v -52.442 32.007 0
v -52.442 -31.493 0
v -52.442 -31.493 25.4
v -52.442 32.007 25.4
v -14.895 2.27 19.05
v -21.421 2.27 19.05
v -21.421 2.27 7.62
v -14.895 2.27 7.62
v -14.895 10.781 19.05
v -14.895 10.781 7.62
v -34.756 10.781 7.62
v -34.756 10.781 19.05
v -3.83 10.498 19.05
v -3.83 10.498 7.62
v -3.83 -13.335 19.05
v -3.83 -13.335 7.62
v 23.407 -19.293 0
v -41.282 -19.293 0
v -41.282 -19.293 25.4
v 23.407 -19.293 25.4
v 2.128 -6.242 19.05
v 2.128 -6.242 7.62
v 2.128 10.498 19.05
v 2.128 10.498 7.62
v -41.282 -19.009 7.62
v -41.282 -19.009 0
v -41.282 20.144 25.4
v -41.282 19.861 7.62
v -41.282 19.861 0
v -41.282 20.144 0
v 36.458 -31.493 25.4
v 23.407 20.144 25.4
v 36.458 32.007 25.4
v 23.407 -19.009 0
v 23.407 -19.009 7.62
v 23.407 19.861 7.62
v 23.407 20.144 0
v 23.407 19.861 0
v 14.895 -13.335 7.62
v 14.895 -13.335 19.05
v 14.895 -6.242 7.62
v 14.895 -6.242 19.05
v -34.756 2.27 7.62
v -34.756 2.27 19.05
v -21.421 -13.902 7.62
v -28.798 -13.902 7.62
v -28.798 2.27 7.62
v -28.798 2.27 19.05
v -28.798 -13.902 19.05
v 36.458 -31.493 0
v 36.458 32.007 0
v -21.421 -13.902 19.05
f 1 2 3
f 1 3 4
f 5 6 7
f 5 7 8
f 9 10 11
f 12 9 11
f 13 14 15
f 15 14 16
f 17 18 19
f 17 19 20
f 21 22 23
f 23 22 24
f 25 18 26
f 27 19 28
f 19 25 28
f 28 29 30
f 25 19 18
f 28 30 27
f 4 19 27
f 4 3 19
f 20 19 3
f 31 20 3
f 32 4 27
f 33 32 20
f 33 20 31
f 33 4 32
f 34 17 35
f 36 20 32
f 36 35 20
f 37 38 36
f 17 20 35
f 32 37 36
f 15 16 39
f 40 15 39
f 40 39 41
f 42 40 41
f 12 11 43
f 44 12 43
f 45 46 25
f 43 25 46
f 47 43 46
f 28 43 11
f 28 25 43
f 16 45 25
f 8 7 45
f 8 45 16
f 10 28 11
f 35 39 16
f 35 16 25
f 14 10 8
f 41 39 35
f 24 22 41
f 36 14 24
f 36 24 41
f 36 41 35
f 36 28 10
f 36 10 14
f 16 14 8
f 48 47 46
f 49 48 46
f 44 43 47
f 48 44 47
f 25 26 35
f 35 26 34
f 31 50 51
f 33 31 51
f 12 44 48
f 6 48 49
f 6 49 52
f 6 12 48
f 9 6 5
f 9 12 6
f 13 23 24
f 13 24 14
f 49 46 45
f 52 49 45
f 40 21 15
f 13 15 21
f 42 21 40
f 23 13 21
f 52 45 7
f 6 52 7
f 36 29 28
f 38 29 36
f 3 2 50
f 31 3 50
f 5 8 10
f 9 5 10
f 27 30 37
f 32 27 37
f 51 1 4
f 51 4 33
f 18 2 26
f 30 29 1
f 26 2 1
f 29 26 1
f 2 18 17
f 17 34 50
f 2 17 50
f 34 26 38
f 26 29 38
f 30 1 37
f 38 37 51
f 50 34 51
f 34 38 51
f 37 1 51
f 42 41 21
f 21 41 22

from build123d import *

# Parameters (mm, degrees)
F0_W     = 88.9
F0_H     = 63.5
F0_W_2   = 64.688936
F0_H_2   = 39.437553
F1_DEPTH = 25.4
F2_W     = 64.972658
F2_H     = 38.870107
F3_DEPTH = 7.62
F5_DEPTH = 19.05
F7_DEPTH = 19.05


with BuildPart() as f1:
    # F0 (on Top) → F1 (new body)
    with BuildSketch(Plane.XY):
        with Locations((-7.991541, 0.256701)):
            Rectangle(F0_W, F0_H)
        with Locations((-8.937288, 0.425585)):
            Rectangle(F0_W_2, F0_H_2, mode=Mode.SUBTRACT)
    extrude(amount=F1_DEPTH)

    # F2 (on Top) → F3 (join)
    with BuildSketch(Plane.XY):
        with Locations((-9.079149, 0.425584)):
            Rectangle(F2_W, F2_H)
    extrude(amount=F3_DEPTH)

    # F4 (on Top) → F5 (join)
    with BuildSketch(Plane.XY):
        Polygon((-14.895479, 10.781489), (-34.756117, 10.781489), (-34.756117, 2.269787), (-28.797926, 2.269787), (-28.797926, -13.902447), (-21.421118, -13.902447), (-21.421118, 2.269787), (-14.895479, 2.269787), align=None)
    extrude(amount=F5_DEPTH)

    # F6 (on Top) → F7 (join)
    with BuildSketch(Plane.XY):
        Polygon((2.127926, 10.497767), (-3.830266, 10.497767), (-3.830266, -13.335001), (14.895479, -13.335001), (14.895479, -6.241915), (2.127926, -6.241915), align=None)
    extrude(amount=F7_DEPTH)


solid = f1.part
